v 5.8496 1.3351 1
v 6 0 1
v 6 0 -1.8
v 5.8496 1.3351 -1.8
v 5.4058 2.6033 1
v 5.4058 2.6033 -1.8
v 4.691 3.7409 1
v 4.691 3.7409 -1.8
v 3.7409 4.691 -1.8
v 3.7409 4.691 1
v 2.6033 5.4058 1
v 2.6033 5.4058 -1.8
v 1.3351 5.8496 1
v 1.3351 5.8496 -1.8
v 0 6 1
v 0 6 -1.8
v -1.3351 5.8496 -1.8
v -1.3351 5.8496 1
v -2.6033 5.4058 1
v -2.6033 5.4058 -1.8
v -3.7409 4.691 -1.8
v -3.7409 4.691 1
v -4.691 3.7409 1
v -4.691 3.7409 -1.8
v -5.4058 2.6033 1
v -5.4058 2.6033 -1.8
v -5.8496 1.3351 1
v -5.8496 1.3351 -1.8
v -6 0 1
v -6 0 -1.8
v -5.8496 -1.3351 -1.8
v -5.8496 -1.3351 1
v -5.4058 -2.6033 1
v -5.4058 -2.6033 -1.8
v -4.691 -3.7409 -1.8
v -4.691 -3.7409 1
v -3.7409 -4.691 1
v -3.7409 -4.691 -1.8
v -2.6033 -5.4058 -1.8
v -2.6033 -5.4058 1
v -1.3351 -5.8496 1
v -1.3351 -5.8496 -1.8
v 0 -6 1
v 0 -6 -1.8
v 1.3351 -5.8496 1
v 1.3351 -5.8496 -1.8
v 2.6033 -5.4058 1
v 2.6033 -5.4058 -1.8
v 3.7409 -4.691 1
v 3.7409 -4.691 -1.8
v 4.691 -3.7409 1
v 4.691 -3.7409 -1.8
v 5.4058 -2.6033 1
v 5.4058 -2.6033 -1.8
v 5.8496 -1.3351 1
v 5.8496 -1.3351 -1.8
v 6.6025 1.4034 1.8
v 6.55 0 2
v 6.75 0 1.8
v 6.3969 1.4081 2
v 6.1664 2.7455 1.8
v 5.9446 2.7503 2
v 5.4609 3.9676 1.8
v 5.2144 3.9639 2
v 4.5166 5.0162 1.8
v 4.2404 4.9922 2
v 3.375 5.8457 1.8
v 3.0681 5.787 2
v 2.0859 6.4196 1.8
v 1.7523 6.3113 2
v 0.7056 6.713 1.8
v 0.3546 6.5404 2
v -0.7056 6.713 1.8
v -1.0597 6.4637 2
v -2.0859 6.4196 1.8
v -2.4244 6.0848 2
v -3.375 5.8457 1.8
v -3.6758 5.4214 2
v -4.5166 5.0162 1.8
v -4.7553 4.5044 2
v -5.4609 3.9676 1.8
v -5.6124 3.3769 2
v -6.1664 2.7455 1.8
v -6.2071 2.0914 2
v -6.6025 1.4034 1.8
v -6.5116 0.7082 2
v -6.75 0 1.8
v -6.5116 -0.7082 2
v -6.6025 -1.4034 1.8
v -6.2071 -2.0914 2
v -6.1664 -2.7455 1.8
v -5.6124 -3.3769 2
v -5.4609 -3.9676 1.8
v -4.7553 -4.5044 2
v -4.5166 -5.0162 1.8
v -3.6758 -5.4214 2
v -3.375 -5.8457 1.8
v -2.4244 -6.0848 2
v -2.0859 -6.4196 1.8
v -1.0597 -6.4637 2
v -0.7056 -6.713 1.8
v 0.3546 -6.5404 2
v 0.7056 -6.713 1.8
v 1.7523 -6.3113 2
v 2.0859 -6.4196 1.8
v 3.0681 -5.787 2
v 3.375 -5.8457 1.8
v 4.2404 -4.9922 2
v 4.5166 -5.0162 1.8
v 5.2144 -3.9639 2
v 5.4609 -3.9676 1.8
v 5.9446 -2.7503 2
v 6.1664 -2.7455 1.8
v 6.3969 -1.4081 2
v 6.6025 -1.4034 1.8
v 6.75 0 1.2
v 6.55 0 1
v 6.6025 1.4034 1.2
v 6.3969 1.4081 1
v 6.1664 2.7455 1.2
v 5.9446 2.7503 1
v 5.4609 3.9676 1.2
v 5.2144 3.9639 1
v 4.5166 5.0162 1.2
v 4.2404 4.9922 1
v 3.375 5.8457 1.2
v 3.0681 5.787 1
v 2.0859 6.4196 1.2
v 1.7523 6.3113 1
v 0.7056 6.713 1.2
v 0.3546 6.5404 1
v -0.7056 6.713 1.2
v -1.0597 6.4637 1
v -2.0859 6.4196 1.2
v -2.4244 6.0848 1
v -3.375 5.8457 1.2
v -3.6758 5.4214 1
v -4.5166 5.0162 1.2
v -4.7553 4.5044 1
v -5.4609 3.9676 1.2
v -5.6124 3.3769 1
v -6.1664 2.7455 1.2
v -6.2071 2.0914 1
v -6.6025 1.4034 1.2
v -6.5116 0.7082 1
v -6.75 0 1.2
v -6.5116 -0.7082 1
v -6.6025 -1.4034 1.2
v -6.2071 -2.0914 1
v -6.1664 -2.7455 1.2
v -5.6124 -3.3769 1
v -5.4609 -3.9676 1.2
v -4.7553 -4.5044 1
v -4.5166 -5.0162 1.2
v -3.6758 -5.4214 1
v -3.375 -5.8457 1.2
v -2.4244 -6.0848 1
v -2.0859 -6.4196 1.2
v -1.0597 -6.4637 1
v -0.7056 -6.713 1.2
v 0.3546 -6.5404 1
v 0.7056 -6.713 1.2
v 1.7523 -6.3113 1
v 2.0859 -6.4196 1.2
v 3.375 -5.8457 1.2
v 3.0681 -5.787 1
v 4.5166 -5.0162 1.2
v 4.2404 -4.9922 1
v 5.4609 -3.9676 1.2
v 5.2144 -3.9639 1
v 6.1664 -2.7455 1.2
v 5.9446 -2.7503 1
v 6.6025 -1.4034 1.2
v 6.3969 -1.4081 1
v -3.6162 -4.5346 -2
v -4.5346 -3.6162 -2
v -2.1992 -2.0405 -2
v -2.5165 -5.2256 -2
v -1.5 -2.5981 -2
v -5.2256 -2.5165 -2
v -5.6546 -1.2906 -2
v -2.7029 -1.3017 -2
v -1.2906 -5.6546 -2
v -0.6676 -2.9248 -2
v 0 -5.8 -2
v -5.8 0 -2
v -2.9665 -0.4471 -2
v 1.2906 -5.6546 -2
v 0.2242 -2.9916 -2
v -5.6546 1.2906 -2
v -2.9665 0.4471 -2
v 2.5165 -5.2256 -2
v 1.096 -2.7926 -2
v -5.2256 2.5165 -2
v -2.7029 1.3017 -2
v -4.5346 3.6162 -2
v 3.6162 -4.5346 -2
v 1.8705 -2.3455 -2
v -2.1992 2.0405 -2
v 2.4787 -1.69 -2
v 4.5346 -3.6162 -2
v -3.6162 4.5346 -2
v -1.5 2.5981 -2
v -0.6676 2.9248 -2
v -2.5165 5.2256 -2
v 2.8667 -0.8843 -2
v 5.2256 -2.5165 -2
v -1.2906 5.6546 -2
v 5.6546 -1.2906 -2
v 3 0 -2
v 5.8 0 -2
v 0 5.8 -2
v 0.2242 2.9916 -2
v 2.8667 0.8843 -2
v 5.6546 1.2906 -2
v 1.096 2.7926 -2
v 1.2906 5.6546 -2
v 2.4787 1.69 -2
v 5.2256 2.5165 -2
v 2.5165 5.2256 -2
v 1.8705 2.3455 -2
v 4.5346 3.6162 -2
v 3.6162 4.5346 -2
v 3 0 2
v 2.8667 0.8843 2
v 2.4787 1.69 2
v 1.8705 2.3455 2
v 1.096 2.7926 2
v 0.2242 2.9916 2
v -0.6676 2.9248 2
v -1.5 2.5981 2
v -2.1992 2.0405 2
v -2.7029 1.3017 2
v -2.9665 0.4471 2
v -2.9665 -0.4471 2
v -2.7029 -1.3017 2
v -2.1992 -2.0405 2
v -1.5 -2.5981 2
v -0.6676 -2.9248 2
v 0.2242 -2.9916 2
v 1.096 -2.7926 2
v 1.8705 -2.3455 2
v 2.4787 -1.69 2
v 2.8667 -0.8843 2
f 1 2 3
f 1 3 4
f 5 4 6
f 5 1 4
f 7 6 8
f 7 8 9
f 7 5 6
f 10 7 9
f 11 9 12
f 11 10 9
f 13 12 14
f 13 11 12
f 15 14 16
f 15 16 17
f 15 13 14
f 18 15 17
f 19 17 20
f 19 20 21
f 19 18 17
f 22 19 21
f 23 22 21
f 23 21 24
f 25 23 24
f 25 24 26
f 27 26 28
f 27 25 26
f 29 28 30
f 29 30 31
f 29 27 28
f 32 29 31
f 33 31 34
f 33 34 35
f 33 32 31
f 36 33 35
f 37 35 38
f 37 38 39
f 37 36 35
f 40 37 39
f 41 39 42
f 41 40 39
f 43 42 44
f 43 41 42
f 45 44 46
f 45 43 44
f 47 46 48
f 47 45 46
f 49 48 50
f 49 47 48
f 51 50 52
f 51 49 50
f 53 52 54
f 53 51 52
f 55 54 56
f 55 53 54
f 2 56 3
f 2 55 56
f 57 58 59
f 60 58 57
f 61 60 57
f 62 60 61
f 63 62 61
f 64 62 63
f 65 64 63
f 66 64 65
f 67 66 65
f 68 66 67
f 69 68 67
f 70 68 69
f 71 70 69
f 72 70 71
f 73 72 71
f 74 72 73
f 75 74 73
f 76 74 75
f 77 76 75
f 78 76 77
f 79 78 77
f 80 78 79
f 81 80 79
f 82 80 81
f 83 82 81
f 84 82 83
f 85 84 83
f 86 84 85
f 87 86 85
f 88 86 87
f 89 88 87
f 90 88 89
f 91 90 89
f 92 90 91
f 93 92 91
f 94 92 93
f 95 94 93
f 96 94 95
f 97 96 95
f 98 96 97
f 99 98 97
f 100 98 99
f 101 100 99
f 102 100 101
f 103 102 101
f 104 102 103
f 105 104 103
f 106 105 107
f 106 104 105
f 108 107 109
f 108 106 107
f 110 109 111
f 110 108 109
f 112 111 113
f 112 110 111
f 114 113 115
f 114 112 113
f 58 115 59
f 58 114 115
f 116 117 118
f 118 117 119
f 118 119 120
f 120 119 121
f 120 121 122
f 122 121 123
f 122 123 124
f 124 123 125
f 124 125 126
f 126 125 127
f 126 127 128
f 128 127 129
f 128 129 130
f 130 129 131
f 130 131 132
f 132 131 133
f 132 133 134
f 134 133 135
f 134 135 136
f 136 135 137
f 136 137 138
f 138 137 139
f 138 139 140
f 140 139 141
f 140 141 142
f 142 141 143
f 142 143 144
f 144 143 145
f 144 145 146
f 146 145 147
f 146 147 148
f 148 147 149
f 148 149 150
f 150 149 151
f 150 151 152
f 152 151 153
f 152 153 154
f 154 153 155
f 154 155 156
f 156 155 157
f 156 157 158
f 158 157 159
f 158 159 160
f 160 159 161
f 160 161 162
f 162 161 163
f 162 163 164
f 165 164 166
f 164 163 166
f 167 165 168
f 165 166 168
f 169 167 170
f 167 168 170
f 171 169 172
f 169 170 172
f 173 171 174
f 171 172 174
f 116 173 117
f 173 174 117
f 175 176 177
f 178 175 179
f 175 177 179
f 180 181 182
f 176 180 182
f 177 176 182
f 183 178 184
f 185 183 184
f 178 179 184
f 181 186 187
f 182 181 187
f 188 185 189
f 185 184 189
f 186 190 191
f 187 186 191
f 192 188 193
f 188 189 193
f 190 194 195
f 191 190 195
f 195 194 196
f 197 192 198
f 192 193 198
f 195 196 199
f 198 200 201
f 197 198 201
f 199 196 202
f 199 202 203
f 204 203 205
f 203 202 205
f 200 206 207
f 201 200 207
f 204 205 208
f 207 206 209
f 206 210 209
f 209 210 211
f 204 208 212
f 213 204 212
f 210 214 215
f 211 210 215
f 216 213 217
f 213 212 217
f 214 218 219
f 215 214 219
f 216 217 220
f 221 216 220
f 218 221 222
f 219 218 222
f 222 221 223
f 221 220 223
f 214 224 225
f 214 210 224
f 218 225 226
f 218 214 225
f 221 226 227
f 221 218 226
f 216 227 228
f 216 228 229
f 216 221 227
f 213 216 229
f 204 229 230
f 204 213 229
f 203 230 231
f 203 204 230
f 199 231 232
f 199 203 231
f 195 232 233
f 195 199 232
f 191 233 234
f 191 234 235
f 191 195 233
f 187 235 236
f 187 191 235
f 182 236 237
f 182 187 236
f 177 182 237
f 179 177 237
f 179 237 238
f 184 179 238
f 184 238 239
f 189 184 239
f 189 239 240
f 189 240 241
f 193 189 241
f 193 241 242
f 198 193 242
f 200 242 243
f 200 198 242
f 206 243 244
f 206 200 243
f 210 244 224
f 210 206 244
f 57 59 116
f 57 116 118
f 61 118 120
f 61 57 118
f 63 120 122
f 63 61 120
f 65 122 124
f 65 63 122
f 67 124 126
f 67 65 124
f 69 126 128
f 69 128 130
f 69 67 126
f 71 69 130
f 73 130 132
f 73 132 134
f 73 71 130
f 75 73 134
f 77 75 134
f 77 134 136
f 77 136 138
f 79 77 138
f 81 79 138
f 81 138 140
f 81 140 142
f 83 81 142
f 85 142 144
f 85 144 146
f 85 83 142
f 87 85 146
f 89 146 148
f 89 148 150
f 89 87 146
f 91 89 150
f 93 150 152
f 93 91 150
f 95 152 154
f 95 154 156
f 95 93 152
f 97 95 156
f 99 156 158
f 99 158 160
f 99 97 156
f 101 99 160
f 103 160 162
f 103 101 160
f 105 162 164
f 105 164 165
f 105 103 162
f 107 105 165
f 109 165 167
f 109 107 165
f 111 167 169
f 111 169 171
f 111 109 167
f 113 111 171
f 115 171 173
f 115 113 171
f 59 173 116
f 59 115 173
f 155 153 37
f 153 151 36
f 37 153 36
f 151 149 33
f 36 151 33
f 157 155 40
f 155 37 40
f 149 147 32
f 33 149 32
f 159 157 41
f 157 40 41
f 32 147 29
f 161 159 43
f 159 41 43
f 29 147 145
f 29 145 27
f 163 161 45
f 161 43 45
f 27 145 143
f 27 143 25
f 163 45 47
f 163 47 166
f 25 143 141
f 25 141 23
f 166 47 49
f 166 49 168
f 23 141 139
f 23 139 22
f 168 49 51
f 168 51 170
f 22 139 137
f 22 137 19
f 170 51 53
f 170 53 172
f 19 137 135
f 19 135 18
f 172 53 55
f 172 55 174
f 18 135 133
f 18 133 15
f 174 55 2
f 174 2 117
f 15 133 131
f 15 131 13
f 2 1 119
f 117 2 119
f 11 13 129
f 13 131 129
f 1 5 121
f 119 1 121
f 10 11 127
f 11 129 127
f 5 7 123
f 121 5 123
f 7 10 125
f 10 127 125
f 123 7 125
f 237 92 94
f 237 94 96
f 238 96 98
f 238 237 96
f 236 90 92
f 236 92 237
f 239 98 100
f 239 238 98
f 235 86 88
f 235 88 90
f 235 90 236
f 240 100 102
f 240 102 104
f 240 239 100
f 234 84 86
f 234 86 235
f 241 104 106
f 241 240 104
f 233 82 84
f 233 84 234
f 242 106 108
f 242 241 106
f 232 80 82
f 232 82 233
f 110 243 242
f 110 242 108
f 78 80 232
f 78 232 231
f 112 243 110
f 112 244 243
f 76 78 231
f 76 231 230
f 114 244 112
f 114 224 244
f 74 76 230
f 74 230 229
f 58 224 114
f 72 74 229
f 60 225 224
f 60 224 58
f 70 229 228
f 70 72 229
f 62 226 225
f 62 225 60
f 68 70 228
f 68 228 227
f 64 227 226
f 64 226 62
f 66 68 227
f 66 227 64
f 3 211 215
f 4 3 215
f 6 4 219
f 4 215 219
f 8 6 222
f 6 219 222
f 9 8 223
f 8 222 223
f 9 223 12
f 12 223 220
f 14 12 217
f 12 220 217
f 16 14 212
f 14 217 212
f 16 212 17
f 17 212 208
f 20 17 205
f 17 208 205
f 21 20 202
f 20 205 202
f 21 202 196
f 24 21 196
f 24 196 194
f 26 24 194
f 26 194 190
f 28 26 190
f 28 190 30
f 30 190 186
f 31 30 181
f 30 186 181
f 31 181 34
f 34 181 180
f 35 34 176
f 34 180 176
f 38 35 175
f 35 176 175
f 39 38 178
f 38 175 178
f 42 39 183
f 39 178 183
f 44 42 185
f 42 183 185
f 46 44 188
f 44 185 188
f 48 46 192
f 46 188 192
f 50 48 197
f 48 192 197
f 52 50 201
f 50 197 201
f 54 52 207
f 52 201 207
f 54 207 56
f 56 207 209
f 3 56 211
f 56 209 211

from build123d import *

# Parameters (mm, degrees)
SKETCH_1_R      = 6
SKETCH_1_R_2    = 3
EXTRUDE_1_DEPTH = 2
SKETCH_2_R      = 6.75
SKETCH_2_R_2    = 3
EXTRUDE_2_DEPTH = 1
CHAMFER_1_SIZE  = 0.2


with BuildPart() as part:
    # 草图1 → 凸台-拉伸1 (new body, symmetric)
    with BuildSketch(Plane.XY):
        Circle(SKETCH_1_R)
        Circle(SKETCH_1_R_2, mode=Mode.SUBTRACT)
    extrude(amount=EXTRUDE_1_DEPTH, both=True)

    # 草图2 → 凸台-拉伸2 (add)
    with BuildSketch(Plane.XY.offset(2)):
        Circle(SKETCH_2_R)
        Circle(SKETCH_2_R_2, mode=Mode.SUBTRACT)
    extrude(amount=-EXTRUDE_2_DEPTH)

    # 倒角1
    chamfer_1_edges = [part.edges().sort_by_distance(p)[0] for p in [
        (-6.75, 0, 2),
        (-6.75, 0, 1),
        (-6, 0, -2),
    ]]
    chamfer(chamfer_1_edges, length=CHAMFER_1_SIZE)


solid = part.part
